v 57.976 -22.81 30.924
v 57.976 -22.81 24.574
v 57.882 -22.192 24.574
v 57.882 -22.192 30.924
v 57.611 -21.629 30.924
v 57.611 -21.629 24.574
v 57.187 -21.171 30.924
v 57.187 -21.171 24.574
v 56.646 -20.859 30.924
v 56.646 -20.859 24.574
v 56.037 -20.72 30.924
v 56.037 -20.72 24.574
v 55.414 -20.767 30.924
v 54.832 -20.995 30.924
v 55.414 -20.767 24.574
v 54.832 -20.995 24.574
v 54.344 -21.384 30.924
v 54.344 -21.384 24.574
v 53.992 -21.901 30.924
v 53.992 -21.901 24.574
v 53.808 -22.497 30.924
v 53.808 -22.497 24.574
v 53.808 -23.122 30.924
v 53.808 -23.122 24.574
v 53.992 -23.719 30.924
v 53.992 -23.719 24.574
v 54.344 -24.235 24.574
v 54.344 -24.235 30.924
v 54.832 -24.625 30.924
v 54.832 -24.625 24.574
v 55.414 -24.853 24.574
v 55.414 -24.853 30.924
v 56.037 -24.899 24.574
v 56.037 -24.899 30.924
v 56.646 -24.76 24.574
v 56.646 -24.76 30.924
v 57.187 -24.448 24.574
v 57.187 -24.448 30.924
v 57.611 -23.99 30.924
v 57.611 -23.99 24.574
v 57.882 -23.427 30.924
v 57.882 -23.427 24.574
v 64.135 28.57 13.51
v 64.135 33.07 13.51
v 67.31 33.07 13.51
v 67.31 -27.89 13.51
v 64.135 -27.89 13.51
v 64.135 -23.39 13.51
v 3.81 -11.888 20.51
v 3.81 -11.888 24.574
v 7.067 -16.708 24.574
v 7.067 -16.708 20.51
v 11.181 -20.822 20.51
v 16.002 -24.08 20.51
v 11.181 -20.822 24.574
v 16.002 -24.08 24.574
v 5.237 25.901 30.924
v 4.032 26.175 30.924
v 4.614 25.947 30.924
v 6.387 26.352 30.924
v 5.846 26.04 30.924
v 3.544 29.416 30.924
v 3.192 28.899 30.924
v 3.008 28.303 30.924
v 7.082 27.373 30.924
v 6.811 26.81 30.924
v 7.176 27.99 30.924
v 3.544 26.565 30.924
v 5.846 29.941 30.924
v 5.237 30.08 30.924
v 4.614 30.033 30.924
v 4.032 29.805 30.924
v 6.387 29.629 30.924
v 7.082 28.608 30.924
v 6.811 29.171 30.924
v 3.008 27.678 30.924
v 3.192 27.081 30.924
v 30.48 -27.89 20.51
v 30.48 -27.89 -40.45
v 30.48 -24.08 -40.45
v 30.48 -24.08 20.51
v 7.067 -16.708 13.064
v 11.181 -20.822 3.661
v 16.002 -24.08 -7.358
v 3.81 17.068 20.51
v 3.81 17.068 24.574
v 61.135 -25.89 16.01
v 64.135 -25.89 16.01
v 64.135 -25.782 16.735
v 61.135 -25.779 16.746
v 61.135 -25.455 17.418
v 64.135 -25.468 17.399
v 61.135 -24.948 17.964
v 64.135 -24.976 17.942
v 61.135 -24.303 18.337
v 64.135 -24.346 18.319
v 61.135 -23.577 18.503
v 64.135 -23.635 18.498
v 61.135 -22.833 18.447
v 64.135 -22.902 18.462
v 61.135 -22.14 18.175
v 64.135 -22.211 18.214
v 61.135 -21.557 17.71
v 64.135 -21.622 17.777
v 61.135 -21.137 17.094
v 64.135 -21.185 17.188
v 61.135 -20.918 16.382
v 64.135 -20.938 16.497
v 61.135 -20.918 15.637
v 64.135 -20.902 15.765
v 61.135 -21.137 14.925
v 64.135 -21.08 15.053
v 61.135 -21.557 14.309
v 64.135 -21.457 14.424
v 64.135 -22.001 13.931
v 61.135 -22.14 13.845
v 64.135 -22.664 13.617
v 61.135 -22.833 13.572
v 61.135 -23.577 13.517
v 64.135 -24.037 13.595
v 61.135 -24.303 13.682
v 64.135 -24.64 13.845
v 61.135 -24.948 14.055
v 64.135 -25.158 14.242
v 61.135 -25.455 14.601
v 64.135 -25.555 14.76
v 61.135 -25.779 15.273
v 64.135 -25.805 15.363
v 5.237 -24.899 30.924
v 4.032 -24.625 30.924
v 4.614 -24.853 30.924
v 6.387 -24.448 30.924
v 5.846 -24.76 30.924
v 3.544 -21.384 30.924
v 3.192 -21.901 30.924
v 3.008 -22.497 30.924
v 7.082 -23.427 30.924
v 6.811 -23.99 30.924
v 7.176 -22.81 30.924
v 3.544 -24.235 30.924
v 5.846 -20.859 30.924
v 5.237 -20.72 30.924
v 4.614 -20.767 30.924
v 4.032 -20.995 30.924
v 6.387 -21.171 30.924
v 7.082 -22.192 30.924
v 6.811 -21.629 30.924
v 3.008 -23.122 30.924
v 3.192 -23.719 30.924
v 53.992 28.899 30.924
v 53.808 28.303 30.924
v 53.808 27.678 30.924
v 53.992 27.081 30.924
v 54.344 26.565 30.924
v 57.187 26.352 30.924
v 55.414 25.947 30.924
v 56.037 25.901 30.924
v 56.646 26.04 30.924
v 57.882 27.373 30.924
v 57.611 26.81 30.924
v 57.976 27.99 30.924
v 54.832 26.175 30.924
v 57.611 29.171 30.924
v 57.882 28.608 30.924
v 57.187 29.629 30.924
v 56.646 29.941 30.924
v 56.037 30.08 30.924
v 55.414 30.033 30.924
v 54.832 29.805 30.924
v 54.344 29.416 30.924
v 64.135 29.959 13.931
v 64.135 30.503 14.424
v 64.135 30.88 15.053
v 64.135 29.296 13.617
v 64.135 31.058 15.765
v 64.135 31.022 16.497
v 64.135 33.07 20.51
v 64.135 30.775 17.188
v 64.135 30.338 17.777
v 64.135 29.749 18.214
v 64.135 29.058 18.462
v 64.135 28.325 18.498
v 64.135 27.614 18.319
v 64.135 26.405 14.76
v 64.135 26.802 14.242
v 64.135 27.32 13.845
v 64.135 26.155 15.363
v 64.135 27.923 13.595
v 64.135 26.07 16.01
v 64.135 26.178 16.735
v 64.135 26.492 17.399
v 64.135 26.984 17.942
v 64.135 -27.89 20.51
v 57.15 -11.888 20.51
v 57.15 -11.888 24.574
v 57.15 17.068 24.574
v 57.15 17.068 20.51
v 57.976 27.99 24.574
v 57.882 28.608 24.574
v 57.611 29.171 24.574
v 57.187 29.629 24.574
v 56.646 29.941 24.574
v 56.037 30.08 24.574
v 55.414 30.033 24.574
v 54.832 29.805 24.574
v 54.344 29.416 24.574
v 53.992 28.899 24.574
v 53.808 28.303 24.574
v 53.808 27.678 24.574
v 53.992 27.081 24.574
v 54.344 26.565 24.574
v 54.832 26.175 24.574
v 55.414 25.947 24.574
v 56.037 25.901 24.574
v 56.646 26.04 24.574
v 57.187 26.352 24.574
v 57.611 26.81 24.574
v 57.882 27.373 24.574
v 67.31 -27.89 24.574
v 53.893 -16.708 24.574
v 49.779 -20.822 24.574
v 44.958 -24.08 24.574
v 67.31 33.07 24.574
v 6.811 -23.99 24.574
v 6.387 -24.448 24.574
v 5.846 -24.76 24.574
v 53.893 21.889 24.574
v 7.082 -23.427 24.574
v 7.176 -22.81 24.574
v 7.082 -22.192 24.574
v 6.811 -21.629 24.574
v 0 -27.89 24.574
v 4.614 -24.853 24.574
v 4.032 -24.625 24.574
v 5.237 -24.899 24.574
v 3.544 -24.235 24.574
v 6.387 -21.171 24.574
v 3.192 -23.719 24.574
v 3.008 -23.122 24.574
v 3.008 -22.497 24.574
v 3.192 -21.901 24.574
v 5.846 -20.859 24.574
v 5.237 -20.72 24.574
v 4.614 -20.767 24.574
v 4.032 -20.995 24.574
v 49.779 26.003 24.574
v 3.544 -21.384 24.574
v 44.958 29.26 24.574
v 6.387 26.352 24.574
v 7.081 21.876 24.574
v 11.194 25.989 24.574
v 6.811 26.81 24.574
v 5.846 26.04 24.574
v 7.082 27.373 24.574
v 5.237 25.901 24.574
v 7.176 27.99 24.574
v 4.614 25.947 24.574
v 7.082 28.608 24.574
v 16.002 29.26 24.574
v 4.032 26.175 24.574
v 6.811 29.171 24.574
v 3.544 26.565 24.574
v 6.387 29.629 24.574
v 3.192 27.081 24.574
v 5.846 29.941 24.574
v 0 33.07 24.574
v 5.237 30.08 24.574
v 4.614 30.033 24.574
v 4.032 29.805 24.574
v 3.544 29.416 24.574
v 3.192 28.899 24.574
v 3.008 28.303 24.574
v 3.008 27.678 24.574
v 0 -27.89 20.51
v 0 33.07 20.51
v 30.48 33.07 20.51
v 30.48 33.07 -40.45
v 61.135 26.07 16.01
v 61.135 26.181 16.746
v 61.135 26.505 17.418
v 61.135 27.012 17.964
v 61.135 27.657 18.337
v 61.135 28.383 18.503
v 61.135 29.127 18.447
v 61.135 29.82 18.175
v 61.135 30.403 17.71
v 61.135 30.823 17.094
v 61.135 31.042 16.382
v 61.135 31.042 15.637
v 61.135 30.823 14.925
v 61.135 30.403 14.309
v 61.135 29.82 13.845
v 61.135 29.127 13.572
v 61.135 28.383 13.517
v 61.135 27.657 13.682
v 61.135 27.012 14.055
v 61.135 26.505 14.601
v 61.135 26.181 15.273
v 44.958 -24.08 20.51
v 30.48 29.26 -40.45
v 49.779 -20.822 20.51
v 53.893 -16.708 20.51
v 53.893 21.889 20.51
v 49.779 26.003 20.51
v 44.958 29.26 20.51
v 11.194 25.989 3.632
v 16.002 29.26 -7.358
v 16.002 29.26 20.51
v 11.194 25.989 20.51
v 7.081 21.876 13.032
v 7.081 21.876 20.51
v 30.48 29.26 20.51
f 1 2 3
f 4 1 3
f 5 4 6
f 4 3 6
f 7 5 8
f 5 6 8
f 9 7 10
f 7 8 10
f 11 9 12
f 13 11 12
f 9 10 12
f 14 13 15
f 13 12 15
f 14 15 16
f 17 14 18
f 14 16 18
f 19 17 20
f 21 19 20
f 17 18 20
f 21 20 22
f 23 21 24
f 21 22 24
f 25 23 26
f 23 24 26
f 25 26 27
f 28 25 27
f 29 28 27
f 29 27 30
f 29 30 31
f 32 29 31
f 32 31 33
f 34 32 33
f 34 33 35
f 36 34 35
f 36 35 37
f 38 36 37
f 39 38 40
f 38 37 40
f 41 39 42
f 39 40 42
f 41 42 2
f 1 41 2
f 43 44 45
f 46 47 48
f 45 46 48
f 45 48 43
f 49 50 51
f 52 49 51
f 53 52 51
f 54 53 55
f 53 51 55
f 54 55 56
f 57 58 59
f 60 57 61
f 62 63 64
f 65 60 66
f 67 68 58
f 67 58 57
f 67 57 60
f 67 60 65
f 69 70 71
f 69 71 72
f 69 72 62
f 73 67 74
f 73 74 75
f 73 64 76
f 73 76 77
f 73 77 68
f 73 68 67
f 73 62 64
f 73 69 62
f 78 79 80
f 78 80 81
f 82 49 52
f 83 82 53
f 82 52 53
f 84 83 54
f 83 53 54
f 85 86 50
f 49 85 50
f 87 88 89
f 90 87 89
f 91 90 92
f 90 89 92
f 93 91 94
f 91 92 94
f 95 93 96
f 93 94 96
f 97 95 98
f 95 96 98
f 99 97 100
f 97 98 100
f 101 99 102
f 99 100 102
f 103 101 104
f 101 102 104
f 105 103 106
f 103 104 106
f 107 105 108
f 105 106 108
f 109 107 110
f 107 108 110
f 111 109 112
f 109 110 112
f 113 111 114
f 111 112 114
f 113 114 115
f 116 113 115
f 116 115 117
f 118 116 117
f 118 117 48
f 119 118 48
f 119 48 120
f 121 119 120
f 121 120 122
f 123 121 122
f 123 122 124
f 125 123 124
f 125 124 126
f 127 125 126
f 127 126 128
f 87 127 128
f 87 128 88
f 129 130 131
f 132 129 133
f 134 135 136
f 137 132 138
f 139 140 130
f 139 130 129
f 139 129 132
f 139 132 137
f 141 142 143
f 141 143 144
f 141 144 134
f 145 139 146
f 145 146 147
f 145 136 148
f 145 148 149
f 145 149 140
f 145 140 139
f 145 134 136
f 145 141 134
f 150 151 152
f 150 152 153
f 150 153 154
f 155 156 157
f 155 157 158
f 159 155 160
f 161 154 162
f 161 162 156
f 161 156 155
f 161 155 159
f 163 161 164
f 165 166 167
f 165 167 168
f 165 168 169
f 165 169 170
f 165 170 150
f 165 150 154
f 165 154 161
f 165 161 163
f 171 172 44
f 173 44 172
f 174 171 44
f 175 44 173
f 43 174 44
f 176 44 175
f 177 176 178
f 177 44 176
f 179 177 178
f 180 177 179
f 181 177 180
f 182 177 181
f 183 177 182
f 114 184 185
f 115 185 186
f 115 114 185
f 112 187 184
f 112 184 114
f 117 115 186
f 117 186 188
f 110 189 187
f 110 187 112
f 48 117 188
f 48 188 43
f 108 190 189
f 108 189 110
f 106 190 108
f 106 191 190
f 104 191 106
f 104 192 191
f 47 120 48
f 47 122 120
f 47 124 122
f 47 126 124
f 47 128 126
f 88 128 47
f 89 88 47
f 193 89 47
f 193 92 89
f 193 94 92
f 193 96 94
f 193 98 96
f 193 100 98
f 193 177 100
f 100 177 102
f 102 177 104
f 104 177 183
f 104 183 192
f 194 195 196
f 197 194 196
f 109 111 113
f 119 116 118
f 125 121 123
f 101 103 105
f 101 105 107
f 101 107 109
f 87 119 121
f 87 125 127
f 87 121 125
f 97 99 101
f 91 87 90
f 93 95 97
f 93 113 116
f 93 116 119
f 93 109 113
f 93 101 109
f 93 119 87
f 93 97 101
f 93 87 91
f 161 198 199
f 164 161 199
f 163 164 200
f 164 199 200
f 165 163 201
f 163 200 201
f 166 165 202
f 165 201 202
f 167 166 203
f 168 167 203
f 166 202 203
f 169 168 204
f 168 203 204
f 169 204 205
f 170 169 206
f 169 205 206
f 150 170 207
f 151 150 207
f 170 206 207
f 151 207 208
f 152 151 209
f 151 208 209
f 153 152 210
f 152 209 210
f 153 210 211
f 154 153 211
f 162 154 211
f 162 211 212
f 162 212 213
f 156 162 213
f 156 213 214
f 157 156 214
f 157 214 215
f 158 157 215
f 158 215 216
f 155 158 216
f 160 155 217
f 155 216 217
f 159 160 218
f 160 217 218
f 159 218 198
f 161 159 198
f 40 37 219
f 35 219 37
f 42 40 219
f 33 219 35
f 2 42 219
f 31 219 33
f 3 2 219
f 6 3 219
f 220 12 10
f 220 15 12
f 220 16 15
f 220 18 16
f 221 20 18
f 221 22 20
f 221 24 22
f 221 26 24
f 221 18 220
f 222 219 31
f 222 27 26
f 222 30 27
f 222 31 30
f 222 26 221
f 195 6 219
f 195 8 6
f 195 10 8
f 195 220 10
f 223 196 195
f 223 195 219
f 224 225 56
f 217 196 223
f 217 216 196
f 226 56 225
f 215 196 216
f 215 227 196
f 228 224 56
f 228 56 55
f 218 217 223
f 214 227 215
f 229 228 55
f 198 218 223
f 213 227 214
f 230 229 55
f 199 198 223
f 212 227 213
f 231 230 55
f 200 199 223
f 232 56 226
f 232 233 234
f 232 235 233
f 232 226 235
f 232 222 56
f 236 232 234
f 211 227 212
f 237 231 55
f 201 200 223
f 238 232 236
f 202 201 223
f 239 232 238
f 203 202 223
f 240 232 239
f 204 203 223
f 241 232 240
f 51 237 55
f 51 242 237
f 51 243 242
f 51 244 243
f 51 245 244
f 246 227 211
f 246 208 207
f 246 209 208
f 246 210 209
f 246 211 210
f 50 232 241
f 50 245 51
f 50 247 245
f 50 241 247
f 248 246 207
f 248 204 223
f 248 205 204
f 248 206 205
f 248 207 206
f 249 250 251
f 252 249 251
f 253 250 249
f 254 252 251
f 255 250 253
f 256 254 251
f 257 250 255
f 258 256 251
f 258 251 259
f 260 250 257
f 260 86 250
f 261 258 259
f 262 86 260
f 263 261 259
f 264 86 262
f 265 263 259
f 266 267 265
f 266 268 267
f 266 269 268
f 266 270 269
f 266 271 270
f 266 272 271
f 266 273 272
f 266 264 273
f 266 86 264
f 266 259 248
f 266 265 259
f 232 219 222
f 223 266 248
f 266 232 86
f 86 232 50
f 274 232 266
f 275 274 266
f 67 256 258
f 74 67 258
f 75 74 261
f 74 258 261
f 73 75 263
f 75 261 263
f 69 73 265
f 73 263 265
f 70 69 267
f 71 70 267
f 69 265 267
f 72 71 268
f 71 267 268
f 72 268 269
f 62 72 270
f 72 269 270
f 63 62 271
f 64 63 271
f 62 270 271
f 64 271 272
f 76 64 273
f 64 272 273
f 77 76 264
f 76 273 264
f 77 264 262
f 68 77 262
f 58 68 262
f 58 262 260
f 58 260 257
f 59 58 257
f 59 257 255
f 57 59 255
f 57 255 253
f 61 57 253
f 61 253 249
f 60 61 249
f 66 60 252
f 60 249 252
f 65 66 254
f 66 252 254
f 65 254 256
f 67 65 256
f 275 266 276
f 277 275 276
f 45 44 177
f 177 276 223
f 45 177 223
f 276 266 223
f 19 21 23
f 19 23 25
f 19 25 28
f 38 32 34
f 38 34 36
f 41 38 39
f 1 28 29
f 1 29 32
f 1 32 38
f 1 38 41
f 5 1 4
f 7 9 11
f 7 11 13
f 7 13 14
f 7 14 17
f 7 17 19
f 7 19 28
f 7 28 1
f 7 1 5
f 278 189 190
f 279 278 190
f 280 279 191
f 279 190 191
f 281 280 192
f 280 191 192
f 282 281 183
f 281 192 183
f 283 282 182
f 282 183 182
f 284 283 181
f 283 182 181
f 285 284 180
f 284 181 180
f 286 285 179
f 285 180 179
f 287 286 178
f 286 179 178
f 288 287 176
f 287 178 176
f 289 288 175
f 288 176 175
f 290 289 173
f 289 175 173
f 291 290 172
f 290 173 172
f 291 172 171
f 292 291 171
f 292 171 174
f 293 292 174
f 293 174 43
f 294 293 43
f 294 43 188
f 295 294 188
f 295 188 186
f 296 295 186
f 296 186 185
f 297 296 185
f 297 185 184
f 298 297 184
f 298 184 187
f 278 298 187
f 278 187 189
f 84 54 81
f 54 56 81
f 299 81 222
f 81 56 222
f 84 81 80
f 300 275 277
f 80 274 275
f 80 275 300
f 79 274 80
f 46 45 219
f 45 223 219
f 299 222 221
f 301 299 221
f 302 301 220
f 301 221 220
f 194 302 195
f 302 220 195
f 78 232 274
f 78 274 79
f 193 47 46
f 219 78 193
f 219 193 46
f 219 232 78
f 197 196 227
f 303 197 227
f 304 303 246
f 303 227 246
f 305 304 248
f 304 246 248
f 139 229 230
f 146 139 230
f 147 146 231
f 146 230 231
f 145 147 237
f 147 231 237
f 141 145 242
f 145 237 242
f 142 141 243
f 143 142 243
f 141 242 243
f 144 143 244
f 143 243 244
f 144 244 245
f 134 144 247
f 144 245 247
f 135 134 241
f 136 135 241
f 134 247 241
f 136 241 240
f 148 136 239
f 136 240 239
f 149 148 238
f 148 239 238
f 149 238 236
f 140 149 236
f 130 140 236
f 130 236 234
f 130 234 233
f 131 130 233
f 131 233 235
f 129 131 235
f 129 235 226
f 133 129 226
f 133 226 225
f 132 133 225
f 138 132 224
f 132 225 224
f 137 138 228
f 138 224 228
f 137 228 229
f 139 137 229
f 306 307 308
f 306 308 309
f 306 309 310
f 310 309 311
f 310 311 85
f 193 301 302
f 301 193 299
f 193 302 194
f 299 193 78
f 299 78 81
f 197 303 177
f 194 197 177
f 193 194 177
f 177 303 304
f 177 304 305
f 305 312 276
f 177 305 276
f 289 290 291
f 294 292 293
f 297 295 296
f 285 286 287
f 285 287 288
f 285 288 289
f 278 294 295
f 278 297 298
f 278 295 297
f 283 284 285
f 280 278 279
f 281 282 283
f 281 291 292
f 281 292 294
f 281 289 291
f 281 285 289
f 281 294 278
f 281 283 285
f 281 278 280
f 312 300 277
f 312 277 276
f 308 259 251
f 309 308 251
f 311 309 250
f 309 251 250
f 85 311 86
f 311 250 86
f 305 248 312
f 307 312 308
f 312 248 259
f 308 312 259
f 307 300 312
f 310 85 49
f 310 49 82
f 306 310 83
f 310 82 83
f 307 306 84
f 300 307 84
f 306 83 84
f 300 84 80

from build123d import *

# Parameters (mm, degrees)
F0_W        = 60.96
F0_H        = 4.064
F1_DEPTH    = 60.96
F3_DEPTH    = 25.4
F4_R        = 2.0955
F5_DEPTH    = 6.35
F7_DEPTH    = 60.96
F8_T4_DEPTH = 53.34
F8_S5_R     = 30.988
F8_T6_DEPTH = 44
F8_S7_R     = 30.48
F8_T8_DEPTH = 44
F9_W        = 60.96
F9_H        = 4.064
F10_DEPTH   = 6.35
F11_W       = 3.175
F11_H       = 60.96
F12_DEPTH   = 7
F13_R       = 2.5
F14_DEPTH   = 3
F15_R       = 2.5
F16_DEPTH   = 3


# Not quite as in the source:
# - a fillet or chamfer that OpenCascade refuses, or shapes differently, is made with other operations: its cross-section is extruded or revolved along the edge and cut away or added


with BuildPart() as f1:
    # F0 (on Right) → F1 (new body)
    with BuildSketch(Plane.YZ):
        with Locations((2.5902520865, 22.5415869818)):
            Rectangle(F0_W, F0_H)
    extrude(amount=F1_DEPTH)

    # F2 (on face) → F3 (cut)
    with BuildSketch(Plane.XY.offset(24.5735869818)):
        with BuildLine():
            Line((16.002, -24.0797479135), (44.958, -24.0797479135))
            ThreePointArc((44.958, -24.0797479135), (51.934072902, -18.8638208155), (57.15, -11.8877479135))
            Line((57.15, -11.8877479135), (57.15, 17.0682520865))
            ThreePointArc((57.15, 17.0682520865), (51.934072902, 24.0443249885), (44.958, 29.2602520865))
            Line((44.958, 29.2602520865), (16.002, 29.2602520865))
            ThreePointArc((16.002, 29.2602520865), (9.0409528702, 24.0292992163), (3.81, 17.0682520865))
            Line((3.81, 17.0682520865), (3.81, -11.8877479135))
            ThreePointArc((3.81, -11.8877479135), (9.025927098, -18.8638208155), (16.002, -24.0797479135))
        make_face()
    extrude(amount=-F3_DEPTH, mode=Mode.SUBTRACT)

    # F4 (on face) → F5 (join)
    with BuildSketch(Plane.XY.offset(24.5735869818)):
        with Locations((55.88, -22.8097479135)):
            Circle(F4_R)
        with Locations((55.88, 27.9902520865)):
            Circle(F4_R)
        with Locations((5.08, -22.8097479135)):
            Circle(F4_R)
        with Locations((5.08, 27.9902520865)):
            Circle(F4_R)
    extrude(amount=F5_DEPTH)

    # F6 (on face) → F7 (join)
    with BuildSketch(Plane.XZ.offset(27.8897479135)):
        Polygon((30.48, -40.4504130182), (30.48, 20.5095869818), (0, 20.5095869818), align=None)
    extrude(amount=-F7_DEPTH)

    # F8: chamfer of 60.96 x 26.67 on 1 edges, made by hand


with BuildPart() as f8_tool2:
    # F8_s3 → F8_t4 (new body)
    with BuildSketch(Plane.XZ.offset(24.0797479135)):
        Polygon((3.81, 20.5095869818), (30.48, -40.4504130182), (30.48, 20.5095869818), align=None)
    extrude(amount=-F8_T4_DEPTH)

    # F8_s5 → F8_t6 (intersect, symmetric)
    with BuildSketch(Plane.XY.offset(-10)):
        with Locations((30.9527778056, 2.1174742809)):
            Circle(F8_S5_R)
    extrude(amount=F8_T6_DEPTH, both=True, mode=Mode.INTERSECT)

    # F8_s7 → F8_t8 (intersect, symmetric)
    with BuildSketch(Plane.XY.offset(-10)):
        with Locations((30.5785417886, 2.6887938751)):
            Circle(F8_S7_R)
    extrude(amount=F8_T8_DEPTH, both=True, mode=Mode.INTERSECT)


with BuildPart() as f1_1:
    add(f1.part)

    # F8_t1: cut F8_tool2
    add(f8_tool2.part, mode=Mode.SUBTRACT)

    # F9 (on face) → F10 (join)
    with BuildSketch(Plane.YZ.offset(60.96)):
        with Locations((2.5902520865, 22.5415869818)):
            Rectangle(F9_W, F9_H)
    extrude(amount=F10_DEPTH)

    # F11 (on face) → F12 (join)
    with BuildSketch(Plane(origin=(0, 0, 20.5095869818), x_dir=(1, 0, 0), z_dir=(0, 0, -1))):
        with Locations((65.7225, -2.5902520865)):
            Rectangle(F11_W, F11_H)
    extrude(amount=F12_DEPTH)

    # F13 (on face) → F14 (join)
    with BuildSketch(Plane(origin=(64.135, 0, 0), x_dir=(0, -1, 0), z_dir=(-1, 0, 0))):
        with Locations((-28.5702520865, 16.0095869818)):
            Circle(F13_R)
    extrude(amount=F14_DEPTH)

    # F15 (on face) → F16 (join)
    with BuildSketch(Plane(origin=(64.135, 0, 0), x_dir=(0, -1, 0), z_dir=(-1, 0, 0))):
        with Locations((23.3897479135, 16.0095869818)):
            Circle(F15_R)
    extrude(amount=F16_DEPTH)


solid = f1_1.part
